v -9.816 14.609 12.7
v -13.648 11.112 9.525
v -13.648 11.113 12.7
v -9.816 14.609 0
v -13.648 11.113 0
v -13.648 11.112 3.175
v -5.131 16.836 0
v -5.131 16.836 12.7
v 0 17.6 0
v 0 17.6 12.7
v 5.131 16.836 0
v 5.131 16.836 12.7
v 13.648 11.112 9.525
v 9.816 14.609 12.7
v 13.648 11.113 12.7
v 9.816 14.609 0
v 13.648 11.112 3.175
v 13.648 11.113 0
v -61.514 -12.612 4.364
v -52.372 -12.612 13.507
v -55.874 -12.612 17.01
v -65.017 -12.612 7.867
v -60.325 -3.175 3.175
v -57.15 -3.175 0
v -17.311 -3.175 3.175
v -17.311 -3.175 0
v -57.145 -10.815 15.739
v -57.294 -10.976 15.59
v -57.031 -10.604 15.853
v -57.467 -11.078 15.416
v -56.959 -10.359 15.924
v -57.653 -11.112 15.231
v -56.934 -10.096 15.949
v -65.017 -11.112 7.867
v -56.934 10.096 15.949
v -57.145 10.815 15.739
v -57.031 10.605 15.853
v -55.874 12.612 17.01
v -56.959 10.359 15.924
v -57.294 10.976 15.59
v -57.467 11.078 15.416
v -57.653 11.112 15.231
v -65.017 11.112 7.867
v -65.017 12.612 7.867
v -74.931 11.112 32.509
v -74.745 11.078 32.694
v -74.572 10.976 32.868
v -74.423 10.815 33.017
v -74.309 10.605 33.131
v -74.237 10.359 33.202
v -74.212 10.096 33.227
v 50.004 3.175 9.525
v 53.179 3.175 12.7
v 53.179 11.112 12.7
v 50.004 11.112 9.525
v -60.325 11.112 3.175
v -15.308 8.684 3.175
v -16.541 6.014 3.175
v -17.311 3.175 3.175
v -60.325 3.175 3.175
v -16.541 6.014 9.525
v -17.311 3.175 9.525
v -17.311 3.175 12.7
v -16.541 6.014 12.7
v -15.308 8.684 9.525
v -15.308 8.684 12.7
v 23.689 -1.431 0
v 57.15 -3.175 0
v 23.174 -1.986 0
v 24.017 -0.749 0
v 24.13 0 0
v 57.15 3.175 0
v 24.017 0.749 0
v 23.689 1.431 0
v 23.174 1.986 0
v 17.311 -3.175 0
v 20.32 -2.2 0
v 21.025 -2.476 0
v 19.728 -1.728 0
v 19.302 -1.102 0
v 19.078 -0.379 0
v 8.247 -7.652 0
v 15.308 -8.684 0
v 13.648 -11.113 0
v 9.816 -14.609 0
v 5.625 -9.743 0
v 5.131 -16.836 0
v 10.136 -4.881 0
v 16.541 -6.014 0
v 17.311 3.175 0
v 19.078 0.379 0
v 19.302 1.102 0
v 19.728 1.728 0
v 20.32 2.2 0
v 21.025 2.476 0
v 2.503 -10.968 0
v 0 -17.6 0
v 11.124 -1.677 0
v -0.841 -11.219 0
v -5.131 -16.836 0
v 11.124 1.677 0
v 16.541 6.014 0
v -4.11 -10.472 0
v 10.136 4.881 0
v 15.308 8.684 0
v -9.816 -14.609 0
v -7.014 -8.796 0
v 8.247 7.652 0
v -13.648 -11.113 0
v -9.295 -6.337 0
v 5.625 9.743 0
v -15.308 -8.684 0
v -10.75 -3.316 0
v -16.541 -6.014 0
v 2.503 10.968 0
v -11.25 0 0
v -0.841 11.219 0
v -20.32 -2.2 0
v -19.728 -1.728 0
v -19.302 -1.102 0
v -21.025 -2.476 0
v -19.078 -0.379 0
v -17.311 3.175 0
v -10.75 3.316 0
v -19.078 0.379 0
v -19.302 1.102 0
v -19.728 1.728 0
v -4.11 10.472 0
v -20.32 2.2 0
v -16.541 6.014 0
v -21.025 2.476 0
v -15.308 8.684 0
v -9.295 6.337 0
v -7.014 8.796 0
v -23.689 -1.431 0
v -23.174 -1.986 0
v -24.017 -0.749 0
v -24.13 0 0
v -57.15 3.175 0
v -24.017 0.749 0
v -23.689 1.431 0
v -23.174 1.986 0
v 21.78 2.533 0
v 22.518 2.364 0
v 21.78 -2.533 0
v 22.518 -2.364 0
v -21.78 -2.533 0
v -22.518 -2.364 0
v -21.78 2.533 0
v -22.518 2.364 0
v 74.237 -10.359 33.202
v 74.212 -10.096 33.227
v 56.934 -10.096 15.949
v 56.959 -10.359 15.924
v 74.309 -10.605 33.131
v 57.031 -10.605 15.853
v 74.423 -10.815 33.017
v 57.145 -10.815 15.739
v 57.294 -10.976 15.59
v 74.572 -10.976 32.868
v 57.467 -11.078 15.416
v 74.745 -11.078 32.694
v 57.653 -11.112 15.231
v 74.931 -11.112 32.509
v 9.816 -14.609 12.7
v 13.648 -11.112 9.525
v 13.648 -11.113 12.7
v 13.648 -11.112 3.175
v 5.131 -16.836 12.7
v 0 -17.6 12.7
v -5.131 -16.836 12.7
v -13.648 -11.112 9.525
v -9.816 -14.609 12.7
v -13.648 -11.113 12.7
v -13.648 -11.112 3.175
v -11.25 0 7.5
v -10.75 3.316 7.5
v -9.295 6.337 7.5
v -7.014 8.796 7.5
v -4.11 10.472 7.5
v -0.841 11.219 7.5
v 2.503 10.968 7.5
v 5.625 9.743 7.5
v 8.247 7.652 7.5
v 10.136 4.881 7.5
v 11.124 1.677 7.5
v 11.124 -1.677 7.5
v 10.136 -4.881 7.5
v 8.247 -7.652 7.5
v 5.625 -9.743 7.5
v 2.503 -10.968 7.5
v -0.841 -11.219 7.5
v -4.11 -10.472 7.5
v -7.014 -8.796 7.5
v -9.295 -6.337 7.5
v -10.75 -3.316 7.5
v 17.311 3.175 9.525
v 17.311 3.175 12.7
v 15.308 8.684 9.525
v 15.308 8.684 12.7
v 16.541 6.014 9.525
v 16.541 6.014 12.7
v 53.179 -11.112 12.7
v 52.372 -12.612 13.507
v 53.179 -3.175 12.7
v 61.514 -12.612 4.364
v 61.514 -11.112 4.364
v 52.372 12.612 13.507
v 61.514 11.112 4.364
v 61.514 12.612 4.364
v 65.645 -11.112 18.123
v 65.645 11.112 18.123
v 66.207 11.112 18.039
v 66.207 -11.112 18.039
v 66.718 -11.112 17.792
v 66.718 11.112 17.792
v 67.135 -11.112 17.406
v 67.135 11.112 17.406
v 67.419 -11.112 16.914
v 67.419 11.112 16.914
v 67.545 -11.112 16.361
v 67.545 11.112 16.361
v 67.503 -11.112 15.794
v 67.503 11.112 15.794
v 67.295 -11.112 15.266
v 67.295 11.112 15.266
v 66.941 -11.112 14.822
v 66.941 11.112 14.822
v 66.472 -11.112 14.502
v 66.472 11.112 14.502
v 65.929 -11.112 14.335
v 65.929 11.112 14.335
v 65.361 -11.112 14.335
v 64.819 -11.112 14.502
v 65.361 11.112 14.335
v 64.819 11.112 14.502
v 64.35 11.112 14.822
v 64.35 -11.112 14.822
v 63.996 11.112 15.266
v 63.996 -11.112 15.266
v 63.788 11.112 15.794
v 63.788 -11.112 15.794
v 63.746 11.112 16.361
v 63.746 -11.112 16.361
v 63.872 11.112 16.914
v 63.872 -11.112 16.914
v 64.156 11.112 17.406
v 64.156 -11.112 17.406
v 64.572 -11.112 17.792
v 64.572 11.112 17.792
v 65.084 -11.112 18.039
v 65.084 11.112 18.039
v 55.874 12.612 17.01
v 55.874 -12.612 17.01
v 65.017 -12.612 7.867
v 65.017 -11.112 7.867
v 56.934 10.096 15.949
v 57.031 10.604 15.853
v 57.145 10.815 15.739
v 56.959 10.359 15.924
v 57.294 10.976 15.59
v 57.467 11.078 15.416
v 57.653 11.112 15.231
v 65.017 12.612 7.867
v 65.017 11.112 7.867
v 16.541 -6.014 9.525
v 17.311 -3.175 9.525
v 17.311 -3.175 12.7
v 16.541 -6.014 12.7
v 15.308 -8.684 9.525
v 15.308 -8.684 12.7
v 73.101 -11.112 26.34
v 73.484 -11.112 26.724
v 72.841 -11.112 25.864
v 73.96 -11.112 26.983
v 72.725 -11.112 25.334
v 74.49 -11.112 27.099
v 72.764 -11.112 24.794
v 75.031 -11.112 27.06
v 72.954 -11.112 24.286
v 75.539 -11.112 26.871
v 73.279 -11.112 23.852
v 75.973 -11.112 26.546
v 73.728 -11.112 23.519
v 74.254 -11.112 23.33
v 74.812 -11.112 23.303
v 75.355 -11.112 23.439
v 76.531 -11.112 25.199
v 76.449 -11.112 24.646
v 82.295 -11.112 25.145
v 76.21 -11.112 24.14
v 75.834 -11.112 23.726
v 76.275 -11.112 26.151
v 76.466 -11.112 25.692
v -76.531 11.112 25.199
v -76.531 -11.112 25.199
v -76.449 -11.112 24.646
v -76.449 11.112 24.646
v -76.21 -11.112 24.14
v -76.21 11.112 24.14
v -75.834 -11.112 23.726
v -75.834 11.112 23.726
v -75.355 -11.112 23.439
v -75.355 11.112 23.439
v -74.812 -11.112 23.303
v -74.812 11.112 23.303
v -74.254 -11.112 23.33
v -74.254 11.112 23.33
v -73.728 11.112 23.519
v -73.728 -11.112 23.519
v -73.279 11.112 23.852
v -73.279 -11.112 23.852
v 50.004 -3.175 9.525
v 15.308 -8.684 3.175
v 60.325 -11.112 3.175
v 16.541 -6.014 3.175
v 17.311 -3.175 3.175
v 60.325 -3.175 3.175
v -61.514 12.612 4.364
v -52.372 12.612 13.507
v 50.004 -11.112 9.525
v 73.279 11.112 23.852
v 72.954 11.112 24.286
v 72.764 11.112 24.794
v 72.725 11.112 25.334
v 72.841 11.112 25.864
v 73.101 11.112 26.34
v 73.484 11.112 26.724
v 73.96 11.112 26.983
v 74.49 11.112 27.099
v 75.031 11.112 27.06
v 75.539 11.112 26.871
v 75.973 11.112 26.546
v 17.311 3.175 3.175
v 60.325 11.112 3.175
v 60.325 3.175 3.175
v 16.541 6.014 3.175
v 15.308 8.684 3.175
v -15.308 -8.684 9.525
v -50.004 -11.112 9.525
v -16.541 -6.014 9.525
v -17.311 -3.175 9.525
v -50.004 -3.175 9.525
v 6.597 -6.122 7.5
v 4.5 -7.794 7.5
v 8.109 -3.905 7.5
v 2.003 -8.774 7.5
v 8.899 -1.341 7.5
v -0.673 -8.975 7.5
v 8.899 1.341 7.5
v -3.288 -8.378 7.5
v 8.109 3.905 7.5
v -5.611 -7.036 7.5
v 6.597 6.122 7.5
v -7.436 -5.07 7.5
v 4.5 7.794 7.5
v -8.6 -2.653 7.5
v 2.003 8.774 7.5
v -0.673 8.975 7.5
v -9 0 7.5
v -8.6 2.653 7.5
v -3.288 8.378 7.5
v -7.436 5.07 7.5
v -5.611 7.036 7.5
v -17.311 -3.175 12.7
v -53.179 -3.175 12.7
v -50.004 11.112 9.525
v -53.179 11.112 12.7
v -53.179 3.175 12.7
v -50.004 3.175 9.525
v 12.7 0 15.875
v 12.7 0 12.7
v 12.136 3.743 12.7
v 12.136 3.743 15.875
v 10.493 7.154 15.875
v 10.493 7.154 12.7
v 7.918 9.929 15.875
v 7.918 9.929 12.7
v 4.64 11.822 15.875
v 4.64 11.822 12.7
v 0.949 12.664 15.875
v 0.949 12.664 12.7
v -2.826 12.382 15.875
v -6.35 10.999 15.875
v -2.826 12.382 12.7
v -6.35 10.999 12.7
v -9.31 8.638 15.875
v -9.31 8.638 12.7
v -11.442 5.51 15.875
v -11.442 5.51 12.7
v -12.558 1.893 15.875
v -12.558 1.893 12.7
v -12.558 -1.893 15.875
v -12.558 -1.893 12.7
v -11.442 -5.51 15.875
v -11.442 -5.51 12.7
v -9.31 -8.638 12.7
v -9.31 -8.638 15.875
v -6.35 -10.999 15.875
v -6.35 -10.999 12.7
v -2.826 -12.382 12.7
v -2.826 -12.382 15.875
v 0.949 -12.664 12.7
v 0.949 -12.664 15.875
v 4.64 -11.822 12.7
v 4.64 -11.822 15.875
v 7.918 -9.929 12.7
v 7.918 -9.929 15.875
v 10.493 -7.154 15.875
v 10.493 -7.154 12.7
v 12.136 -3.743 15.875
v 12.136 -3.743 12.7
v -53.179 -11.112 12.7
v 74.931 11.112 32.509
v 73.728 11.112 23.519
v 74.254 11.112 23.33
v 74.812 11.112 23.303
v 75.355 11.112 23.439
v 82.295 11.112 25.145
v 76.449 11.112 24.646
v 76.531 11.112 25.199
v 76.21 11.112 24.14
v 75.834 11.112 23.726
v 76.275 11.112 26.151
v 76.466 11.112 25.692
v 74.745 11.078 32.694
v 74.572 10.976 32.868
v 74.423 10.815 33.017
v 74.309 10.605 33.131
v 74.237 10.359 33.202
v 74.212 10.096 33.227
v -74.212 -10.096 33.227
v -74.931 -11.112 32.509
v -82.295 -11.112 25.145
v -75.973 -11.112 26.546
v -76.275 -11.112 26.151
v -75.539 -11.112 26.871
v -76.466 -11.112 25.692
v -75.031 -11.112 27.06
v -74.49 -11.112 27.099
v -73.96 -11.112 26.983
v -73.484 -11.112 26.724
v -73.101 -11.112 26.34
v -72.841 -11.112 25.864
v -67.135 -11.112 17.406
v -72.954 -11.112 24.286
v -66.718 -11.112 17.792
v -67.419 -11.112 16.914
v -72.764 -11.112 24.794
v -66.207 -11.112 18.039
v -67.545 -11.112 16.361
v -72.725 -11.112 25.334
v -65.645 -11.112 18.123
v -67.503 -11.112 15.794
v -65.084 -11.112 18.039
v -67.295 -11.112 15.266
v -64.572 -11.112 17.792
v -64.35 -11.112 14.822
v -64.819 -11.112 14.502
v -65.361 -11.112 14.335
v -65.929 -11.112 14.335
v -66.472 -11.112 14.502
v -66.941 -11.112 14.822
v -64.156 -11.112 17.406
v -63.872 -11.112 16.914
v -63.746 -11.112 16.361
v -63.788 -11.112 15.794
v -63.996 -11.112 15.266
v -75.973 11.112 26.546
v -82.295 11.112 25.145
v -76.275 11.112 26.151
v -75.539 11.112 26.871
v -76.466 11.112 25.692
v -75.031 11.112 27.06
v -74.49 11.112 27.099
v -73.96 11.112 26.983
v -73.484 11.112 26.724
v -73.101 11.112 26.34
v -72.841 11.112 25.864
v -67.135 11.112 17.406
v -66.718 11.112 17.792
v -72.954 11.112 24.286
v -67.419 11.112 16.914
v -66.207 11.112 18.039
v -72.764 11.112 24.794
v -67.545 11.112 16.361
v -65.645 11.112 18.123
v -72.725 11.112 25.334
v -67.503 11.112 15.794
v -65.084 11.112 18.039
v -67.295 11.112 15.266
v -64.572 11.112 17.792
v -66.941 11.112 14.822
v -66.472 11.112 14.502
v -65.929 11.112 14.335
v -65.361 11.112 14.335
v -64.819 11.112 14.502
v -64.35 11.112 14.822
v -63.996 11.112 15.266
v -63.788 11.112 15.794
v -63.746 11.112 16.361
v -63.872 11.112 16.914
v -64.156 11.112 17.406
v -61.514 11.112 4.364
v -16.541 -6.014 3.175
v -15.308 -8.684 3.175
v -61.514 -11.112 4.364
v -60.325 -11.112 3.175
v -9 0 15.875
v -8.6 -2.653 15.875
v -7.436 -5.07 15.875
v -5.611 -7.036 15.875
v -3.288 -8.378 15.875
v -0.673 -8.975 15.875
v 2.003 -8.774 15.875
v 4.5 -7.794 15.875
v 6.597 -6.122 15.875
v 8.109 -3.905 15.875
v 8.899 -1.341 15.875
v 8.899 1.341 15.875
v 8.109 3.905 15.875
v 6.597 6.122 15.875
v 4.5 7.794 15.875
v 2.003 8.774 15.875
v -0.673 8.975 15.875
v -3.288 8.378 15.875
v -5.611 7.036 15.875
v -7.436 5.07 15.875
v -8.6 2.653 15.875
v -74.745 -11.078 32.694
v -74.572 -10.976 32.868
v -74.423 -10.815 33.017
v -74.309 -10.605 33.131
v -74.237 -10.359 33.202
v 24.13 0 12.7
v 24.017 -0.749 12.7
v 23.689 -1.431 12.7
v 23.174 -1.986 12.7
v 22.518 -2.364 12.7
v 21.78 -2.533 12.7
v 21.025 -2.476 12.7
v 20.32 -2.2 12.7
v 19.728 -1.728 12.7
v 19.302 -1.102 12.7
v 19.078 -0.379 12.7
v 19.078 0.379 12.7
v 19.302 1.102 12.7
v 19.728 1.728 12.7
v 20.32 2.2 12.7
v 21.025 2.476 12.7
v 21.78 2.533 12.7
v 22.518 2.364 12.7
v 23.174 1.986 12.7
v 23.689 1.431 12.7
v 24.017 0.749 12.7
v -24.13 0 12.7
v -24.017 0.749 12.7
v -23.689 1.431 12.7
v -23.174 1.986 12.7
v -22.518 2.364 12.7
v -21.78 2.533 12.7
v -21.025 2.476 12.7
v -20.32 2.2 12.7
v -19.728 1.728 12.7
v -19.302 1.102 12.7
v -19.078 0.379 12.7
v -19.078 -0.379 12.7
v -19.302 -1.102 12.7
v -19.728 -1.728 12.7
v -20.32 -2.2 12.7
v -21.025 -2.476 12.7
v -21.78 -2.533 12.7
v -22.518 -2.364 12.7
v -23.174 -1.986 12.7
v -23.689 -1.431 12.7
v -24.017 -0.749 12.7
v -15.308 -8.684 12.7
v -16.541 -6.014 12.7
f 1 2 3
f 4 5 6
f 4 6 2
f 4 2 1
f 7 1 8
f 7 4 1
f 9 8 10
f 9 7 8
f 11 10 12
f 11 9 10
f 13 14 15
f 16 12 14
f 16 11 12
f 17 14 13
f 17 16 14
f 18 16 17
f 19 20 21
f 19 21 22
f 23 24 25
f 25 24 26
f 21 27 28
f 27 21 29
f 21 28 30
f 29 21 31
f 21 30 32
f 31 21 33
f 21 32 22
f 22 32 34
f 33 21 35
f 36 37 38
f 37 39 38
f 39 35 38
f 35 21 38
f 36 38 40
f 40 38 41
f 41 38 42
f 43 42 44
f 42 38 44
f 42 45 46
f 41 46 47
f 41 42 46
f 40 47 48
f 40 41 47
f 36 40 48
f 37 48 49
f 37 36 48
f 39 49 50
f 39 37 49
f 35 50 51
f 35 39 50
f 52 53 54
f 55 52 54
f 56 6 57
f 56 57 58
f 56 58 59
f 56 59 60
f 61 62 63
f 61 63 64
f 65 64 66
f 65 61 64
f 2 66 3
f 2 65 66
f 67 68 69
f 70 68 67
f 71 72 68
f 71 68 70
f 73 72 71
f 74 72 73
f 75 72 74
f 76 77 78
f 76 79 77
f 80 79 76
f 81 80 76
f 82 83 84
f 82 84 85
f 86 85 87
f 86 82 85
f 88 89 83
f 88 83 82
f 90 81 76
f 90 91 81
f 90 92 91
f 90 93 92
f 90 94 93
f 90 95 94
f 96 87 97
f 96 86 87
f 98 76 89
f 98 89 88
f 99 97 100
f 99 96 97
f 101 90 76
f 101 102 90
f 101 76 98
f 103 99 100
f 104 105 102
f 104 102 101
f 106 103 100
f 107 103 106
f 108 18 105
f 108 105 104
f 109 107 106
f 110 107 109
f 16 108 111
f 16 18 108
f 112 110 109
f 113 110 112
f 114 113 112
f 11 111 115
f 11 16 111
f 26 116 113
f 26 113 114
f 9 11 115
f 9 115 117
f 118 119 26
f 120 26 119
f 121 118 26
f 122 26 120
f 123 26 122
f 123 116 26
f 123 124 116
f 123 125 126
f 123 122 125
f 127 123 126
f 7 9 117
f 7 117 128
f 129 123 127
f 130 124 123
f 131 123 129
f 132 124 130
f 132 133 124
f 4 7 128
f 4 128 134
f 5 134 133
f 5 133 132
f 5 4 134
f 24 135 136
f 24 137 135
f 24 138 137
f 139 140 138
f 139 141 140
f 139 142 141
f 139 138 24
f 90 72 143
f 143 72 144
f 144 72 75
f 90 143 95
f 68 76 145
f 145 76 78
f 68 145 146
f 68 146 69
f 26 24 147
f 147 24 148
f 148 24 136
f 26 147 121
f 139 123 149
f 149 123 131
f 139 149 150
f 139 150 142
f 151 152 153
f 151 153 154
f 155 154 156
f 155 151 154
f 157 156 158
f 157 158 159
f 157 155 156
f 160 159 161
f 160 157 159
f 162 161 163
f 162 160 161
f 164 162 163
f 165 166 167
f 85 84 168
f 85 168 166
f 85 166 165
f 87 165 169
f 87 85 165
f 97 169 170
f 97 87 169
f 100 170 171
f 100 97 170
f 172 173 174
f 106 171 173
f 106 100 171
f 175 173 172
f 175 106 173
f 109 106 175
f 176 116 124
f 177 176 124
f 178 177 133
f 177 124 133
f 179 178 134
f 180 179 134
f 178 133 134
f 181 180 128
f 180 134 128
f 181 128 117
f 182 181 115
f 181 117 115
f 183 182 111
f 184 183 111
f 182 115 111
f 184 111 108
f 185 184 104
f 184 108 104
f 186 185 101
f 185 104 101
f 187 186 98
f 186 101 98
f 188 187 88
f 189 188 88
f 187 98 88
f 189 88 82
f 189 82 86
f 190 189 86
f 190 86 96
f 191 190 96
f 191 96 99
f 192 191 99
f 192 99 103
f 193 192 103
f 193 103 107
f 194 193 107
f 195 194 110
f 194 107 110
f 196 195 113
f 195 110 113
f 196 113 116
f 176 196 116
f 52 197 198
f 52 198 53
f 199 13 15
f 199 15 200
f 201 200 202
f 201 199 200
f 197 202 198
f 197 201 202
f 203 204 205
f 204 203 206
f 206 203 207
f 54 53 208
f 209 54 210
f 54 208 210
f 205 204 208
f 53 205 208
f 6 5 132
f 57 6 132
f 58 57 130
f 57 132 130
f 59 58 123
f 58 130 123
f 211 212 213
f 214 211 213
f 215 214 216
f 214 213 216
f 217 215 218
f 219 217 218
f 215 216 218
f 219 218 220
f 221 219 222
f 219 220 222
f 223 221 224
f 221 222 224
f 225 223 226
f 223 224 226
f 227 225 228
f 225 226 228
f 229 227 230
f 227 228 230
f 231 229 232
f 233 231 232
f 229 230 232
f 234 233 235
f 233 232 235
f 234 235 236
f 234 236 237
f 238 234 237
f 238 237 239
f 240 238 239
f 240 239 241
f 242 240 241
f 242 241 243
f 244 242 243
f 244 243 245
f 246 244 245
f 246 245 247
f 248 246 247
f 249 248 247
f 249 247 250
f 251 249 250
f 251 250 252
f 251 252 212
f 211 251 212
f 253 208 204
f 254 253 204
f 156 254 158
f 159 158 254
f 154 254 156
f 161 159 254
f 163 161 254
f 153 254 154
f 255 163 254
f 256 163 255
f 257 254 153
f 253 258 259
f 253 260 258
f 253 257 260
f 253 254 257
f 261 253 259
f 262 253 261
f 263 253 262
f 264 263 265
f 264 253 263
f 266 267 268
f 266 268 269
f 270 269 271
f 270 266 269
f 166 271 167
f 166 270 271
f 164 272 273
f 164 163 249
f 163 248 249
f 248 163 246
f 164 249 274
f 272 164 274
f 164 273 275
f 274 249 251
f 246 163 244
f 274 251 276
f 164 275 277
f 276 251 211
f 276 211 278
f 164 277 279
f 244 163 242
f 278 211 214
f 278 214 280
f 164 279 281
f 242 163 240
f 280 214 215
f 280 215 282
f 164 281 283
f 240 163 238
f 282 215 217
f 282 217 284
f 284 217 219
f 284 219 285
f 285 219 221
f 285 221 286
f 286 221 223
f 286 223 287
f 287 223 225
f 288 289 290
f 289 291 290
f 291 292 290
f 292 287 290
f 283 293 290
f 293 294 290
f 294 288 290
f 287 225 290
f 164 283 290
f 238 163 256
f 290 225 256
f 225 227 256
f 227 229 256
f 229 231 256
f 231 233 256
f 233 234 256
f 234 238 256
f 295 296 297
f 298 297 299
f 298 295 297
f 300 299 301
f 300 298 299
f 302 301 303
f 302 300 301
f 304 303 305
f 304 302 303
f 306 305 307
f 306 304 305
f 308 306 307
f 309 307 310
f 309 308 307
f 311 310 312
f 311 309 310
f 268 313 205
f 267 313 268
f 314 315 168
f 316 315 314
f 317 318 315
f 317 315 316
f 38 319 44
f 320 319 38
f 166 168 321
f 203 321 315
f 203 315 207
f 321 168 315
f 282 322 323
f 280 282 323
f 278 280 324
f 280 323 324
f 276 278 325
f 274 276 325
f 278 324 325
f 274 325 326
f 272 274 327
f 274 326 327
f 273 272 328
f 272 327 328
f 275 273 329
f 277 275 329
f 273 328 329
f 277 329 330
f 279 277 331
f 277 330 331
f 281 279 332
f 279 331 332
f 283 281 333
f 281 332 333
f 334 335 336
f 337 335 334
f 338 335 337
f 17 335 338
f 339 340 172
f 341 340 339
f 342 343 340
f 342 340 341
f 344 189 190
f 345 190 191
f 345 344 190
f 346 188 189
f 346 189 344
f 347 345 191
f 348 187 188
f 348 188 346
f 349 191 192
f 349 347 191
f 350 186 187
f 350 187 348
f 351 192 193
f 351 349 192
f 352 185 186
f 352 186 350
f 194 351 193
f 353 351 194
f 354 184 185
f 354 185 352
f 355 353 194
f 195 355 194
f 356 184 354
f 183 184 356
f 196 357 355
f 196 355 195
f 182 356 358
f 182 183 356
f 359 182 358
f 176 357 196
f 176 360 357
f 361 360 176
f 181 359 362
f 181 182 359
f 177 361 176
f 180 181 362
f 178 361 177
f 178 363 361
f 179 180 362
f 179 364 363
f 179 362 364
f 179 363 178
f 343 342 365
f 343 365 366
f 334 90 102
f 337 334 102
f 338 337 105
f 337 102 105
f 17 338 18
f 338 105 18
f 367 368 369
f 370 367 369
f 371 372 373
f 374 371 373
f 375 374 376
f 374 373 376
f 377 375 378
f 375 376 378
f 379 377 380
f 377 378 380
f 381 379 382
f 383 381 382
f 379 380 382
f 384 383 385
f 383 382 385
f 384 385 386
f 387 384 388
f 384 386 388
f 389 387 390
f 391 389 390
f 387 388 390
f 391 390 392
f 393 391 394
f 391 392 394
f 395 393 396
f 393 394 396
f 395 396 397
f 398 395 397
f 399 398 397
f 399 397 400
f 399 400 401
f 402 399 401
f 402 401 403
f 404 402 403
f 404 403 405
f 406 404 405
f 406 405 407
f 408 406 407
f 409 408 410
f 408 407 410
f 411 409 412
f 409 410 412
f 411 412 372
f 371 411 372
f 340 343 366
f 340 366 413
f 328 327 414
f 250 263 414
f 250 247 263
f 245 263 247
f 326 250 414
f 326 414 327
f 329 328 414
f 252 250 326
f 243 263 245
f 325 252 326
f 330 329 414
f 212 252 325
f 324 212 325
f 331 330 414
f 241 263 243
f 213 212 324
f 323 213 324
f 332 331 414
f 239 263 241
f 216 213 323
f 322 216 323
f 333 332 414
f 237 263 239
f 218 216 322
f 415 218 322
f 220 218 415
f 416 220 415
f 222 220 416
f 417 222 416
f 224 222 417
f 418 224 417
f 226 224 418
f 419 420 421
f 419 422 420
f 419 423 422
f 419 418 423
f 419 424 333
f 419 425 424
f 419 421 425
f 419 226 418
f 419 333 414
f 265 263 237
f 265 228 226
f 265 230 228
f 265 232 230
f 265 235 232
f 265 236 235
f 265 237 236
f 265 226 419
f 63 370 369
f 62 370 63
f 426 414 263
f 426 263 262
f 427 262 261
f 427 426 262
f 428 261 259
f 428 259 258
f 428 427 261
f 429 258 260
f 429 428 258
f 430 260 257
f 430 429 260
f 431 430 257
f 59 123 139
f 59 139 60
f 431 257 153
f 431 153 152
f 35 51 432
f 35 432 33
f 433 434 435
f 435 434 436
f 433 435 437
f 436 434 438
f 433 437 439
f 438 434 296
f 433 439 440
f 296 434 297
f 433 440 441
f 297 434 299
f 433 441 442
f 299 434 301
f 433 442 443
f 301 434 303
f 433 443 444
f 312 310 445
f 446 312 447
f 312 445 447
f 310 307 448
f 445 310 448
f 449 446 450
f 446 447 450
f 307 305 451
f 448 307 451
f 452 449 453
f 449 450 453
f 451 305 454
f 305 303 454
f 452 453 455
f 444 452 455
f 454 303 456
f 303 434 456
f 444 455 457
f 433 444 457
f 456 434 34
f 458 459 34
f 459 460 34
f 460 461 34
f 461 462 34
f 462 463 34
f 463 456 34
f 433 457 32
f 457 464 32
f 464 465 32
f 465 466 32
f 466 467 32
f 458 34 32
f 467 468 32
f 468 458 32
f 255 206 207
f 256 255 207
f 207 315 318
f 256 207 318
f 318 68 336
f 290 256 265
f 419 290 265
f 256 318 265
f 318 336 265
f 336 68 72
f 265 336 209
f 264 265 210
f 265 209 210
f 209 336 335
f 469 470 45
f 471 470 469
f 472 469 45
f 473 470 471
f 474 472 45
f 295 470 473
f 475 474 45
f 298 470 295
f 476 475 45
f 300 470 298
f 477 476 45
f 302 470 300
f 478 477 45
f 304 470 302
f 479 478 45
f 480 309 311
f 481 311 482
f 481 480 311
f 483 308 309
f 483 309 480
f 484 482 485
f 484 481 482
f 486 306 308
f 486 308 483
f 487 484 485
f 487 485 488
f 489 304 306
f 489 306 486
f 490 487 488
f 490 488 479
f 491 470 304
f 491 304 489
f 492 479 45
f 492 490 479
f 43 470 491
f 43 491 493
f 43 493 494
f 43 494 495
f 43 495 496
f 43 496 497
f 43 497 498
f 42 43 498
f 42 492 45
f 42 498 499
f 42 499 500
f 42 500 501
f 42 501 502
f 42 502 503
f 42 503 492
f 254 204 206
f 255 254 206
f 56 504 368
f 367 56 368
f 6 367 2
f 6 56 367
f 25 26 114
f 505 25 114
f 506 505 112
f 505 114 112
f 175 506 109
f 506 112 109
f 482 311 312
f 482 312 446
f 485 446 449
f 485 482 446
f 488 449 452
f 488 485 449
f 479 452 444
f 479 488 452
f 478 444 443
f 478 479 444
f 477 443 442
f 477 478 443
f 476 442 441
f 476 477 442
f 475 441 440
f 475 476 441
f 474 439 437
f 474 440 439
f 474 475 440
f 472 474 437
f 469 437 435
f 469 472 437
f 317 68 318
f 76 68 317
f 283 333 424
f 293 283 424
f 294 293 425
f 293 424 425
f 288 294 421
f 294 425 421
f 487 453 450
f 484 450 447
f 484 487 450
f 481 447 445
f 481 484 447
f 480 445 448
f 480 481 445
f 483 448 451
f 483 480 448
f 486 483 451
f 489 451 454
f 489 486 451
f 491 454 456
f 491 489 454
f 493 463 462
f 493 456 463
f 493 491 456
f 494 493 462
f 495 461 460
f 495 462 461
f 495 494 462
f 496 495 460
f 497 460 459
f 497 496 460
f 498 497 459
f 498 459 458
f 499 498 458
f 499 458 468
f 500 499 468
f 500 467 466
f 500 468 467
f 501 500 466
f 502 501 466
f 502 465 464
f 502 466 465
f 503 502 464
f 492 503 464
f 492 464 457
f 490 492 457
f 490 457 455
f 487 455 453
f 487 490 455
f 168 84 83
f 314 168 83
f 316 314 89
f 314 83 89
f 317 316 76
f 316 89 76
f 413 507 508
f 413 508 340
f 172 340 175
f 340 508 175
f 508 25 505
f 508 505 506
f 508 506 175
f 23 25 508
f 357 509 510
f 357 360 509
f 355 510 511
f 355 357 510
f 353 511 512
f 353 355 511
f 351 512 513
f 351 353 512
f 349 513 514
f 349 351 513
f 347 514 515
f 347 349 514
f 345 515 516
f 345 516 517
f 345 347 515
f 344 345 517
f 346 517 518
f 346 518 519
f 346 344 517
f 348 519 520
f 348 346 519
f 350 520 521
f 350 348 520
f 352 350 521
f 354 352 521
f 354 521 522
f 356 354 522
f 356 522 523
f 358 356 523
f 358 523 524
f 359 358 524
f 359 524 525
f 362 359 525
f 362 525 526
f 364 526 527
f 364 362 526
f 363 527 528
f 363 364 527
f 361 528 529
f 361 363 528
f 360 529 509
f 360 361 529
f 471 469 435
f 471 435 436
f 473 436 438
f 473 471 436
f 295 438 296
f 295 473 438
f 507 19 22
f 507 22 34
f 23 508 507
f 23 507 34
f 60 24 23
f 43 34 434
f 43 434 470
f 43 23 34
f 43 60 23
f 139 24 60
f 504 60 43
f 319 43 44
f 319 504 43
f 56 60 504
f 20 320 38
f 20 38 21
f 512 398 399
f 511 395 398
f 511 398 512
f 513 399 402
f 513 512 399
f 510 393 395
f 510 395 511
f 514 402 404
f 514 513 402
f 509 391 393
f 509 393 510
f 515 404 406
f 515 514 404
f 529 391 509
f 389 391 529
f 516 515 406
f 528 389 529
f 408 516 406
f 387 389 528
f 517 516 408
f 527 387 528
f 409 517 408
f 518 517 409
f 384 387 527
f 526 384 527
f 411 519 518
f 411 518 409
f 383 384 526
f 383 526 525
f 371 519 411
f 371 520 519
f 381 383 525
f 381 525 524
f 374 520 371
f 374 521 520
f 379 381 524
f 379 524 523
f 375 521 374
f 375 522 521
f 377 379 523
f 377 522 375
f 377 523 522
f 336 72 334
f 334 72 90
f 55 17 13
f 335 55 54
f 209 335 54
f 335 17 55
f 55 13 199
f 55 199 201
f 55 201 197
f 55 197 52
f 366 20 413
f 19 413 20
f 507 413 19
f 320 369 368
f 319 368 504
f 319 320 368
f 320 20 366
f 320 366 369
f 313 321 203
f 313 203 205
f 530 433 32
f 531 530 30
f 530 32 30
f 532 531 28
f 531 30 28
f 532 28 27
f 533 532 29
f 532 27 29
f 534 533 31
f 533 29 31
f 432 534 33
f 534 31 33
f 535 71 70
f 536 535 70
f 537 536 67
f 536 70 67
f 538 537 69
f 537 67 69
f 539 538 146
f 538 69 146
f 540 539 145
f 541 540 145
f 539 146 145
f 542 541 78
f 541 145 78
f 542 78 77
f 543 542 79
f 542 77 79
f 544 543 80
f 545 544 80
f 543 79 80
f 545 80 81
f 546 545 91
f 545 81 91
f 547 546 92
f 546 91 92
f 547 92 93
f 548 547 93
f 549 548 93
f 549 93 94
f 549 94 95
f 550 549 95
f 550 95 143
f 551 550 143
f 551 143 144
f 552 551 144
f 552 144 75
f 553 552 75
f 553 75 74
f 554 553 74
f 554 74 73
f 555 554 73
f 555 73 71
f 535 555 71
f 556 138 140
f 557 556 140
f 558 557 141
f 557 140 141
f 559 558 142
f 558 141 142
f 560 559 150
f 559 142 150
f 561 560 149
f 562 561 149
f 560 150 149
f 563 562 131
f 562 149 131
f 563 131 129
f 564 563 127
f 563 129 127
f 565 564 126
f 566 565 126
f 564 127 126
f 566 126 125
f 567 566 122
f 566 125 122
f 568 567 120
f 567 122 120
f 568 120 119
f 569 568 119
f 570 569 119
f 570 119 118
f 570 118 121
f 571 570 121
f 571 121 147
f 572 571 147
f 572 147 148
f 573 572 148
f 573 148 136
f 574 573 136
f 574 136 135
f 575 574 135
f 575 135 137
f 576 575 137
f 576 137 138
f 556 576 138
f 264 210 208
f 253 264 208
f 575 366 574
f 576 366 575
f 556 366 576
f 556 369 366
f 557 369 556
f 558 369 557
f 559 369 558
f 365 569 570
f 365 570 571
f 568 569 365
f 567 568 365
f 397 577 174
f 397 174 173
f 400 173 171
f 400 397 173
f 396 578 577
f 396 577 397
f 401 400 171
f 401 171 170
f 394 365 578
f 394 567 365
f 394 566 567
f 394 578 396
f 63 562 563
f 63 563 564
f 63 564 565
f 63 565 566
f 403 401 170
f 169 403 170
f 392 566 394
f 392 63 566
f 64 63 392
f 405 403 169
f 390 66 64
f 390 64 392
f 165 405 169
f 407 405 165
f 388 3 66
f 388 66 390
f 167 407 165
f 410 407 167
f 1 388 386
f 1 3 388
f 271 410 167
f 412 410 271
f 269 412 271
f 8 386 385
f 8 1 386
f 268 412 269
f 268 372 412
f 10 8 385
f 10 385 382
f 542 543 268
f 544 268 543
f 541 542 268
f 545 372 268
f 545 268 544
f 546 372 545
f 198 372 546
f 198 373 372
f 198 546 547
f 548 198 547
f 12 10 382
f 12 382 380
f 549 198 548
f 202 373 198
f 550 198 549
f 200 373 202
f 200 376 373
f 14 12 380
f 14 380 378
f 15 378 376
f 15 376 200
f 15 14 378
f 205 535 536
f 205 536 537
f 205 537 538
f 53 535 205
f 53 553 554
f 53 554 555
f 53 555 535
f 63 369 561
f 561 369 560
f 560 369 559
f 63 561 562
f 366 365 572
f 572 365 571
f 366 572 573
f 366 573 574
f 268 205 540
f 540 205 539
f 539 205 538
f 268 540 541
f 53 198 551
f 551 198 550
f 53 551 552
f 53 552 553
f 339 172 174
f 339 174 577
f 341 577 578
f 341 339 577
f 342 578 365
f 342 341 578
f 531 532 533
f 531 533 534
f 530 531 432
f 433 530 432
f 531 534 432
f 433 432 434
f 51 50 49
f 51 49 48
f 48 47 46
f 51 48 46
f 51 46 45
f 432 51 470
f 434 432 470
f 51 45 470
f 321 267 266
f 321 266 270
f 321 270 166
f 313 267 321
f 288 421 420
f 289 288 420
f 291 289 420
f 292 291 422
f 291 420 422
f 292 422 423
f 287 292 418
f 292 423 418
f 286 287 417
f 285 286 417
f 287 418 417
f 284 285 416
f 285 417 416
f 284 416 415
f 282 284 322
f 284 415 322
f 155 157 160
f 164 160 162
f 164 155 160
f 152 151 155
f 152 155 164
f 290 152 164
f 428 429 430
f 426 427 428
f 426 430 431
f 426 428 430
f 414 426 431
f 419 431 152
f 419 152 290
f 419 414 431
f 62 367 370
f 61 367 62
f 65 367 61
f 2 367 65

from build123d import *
from build123d.topology import SkipClean

# Parameters (mm, degrees)
BOSS_EXTRUDE1_DEPTH = 11.1125
SKETCH3_R           = 17.6
BOSS_EXTRUDE2_DEPTH = 12.7
SKETCH3_5_R         = 11.25
CUT_EXTRUDE2_DEPTH  = 7.5
SKETCH3_6_R         = 9
CUT_EXTRUDE3_DEPTH  = 12.7
BOSS_EXTRUDE3_START = -31.9278
BOSS_EXTRUDE3_DEPTH = 4.953
FILLET1_R           = 1.016
SKETCH5_R           = 1.905
CUT_EXTRUDE4_DEPTH  = 96.510603758
FILLET3_R           = 1.016
CUT_EXTRUDE5_START  = -3.175
CUT_EXTRUDE5_DEPTH  = 3.175
SKETCH9_W           = 10.961249955
SKETCH9_H           = 7.9375
CUT_EXTRUDE6_DEPTH  = 3.175
CUT_EXTRUDE9_DEPTH  = 2.54
SKETCH13_R          = 12.7
SKETCH13_R_2        = 9
BOSS_EXTRUDE6_DEPTH = 3.175
CHAMFER2_SIZE       = 3.175
SKETCH15_R          = 2.54
CUT_EXTRUDE10_DEPTH = 91.477679673


with BuildPart() as part:
    # Sketch2 → Boss-Extrude1 (new, symmetric)
    with BuildSketch(Plane(origin=(0, 0, 0), x_dir=(1, 0, 0), z_dir=(0, 1, 0))):
        Polygon((0, 0), (-57.15, 0), (-84.090768363, -26.940768363), (-76.008537854, -35.022998872), (-53.685538982, -12.7), (0, -12.7), align=None)
        Polygon((57.15, 0), (0, 0), (0, -12.7), (53.685538982, -12.7), (76.008537854, -35.022998872), (84.090768363, -26.940768363), align=None)
    extrude(amount=BOSS_EXTRUDE1_DEPTH, both=True)

    # Sketch3 → Boss-Extrude2 (add)
    with BuildSketch(Plane(origin=(0, 0, 0), x_dir=(-1, 0, 0), z_dir=(0, 0, -1))):
        Circle(SKETCH3_R)
    extrude(amount=-BOSS_EXTRUDE2_DEPTH)

    # Sketch3<5> → Cut-Extrude2 (cut)
    with BuildSketch(Plane(origin=(0, 0, 0), x_dir=(-1, 0, 0), z_dir=(0, 0, -1))):
        Circle(SKETCH3_5_R)
    extrude(amount=-CUT_EXTRUDE2_DEPTH, mode=Mode.SUBTRACT)

    # Sketch3<6> → Cut-Extrude3 (cut)
    with BuildSketch(Plane(origin=(0, 0, 0), x_dir=(-1, 0, 0), z_dir=(0, 0, -1))):
        Circle(SKETCH3_6_R)
    extrude(amount=-CUT_EXTRUDE3_DEPTH, mode=Mode.SUBTRACT)

    # Sketch4 → Boss-Extrude3 (add)
    with BuildSketch(Plane(origin=(55.515768363, 0, 55.515768363), x_dir=(0.707106781186549, 0, -0.707106781186546), z_dir=(0.707106781186546, 0, 0.707106781186549)).offset(BOSS_EXTRUDE3_START)):
        Polygon((27.481152545, -12.6125), (40.411152545, -12.6125), (40.411152545, -11.1125), (28.981152545, -11.1125), (28.981152545, 11.1125), (40.411152545, 11.1125), (40.411152545, 12.6125), (27.481152545, 12.6125), align=None)
    boss_extrude3 = extrude(amount=BOSS_EXTRUDE3_DEPTH)

    # Fillet1
    fillet1_edges = [part.edges().sort_by_distance(p)[0] for p in [
        (66.471505854, -11.1125, 25.485966872),
        (66.471505854, 11.1125, 25.485966872),
    ]]
    fillet(fillet1_edges, radius=FILLET1_R)

    # Sketch5 → Cut-Extrude4 (cut, through all)
    with BuildSketch(Plane(origin=(0, 11.1125, 0), x_dir=(1, 0, 0), z_dir=(0, 1, 0))):
        with BuildLine():
            ThreePointArc((73.278539993, -23.851560258), (73.278539993, -26.545637094), (75.97261683, -26.545637094))
            Line((75.97261683, -26.545637094), (73.278539993, -23.851560258))
        make_face()
        with BuildLine():
            Line((73.278539993, -23.851560258), (75.97261683, -26.545637094))
            ThreePointArc((75.97261683, -26.545637094), (76.385568921, -25.927610614), (76.530578412, -25.198598676))
            ThreePointArc((76.530578412, -25.198598676), (75.35459035, -23.438608166), (73.278539993, -23.851560258))
        make_face()
        with Locations(Location((65.645322291, -16.218342555, 0), (0, 0, 270))):
            Circle(SKETCH5_R)
    cut_extrude4 = extrude(amount=-CUT_EXTRUDE4_DEPTH, mode=Mode.SUBTRACT)

    # Mirror2: Boss-Extrude3, Cut-Extrude4 across plane
    add(boss_extrude3.mirror(Plane(origin=(0, 0, 0), x_dir=(0, 0, 1), z_dir=(1, 0, 0))))
    add(cut_extrude4.mirror(Plane(origin=(0, 0, 0), x_dir=(0, 0, 1), z_dir=(1, 0, 0))), mode=Mode.SUBTRACT)

    # Fillet3
    fillet3_edges = [part.edges().sort_by_distance(p)[0] for p in [
        (-66.471505854, -11.1125, 25.485966872),
        (-66.471505854, 11.1125, 25.485966872),
    ]]
    fillet(fillet3_edges, radius=FILLET3_R)

    # Sketch6 → Cut-Extrude5 (cut)
    with BuildSketch(Plane.XY.offset(12.7).offset(CUT_EXTRUDE5_START)):
        with BuildLine():
            Line((-53.17880895, 11.1125), (-53.17880895, 3.175))
            Line((-53.17880895, 3.175), (-17.311249955, 3.175))
            ThreePointArc((-17.311249955, 3.175), (-15.980371829, 7.374802791), (-13.648162651, 11.1125))
            Line((-13.648162651, 11.1125), (-53.17880895, 11.1125))
        make_face()
        with BuildLine():
            Line((-17.311249955, -3.175), (-53.17880895, -3.175))
            Line((-53.17880895, -3.175), (-53.17880895, -11.1125))
            Line((-53.17880895, -11.1125), (-13.648162651, -11.1125))
            ThreePointArc((-13.648162651, -11.1125), (-15.980371829, -7.374802791), (-17.311249955, -3.175))
        make_face()
        with BuildLine():
            Line((53.17880895, 11.1125), (13.648162651, 11.1125))
            ThreePointArc((13.648162651, 11.1125), (15.980371829, 7.374802791), (17.311249955, 3.175))
            Line((17.311249955, 3.175), (53.17880895, 3.175))
            Line((53.17880895, 3.175), (53.17880895, 11.1125))
        make_face()
        with BuildLine():
            ThreePointArc((17.311249955, -3.175), (15.980371829, -7.374802791), (13.648162651, -11.1125))
            Line((13.648162651, -11.1125), (53.17880895, -11.1125))
            Line((53.17880895, -11.1125), (53.17880895, -3.175))
            Line((53.17880895, -3.175), (17.311249955, -3.175))
        make_face()
    extrude(amount=CUT_EXTRUDE5_DEPTH, mode=Mode.SUBTRACT)

    # Sketch9 → Cut-Extrude6 (cut)
    with SkipClean():  # the faces are left unmerged after this step: merging them gives an invalid solid
        with BuildSketch(Plane(origin=(0, 0, 0), x_dir=(-1, 0, 0), z_dir=(0, 0, -1))):
            with Locations((62.630624978, -7.14375)):
                Rectangle(SKETCH9_W, SKETCH9_H)
            with BuildLine():
                ThreePointArc((17.311249955, -3.175), (15.980371829, -7.374802791), (13.648162651, -11.1125))
                Line((13.648162651, -11.1125), (57.15, -11.1125))
                Line((57.15, -11.1125), (57.15, -3.175))
                Line((57.15, -3.175), (17.311249955, -3.175))
            make_face()
            with BuildLine():
                Line((57.15, 11.1125), (13.648162651, 11.1125))
                ThreePointArc((13.648162651, 11.1125), (15.980371829, 7.374802791), (17.311249955, 3.175))
                Line((17.311249955, 3.175), (57.15, 3.175))
                Line((57.15, 3.175), (57.15, 11.1125))
            make_face()
            with Locations((62.630624978, 7.14375)):
                Rectangle(SKETCH9_W, SKETCH9_H)
            with BuildLine():
                ThreePointArc((-13.648162651, -11.1125), (-15.980371829, -7.374802791), (-17.311249955, -3.175))
                Line((-17.311249955, -3.175), (-57.15, -3.175))
                Line((-57.15, -3.175), (-57.15, -11.1125))
                Line((-57.15, -11.1125), (-13.648162651, -11.1125))
            make_face()
            with Locations((-62.630624978, -7.14375)):
                Rectangle(SKETCH9_W, SKETCH9_H)
            with BuildLine():
                Line((-57.15, 3.175), (-17.311249955, 3.175))
                ThreePointArc((-17.311249955, 3.175), (-15.980371829, 7.374802791), (-13.648162651, 11.1125))
                Line((-13.648162651, 11.1125), (-57.15, 11.1125))
                Line((-57.15, 11.1125), (-57.15, 3.175))
            make_face()
            with Locations((-62.630624978, 7.14375)):
                Rectangle(SKETCH9_W, SKETCH9_H)
        extrude(amount=-CUT_EXTRUDE6_DEPTH, mode=Mode.SUBTRACT)

    # Sketch12 → Cut-Extrude9 (cut)
    with SkipClean():  # the faces are left unmerged after this step: merging them gives an invalid solid
        with BuildSketch(Plane(origin=(55.515768363, 0, 55.515768363), x_dir=(0.7071067811865486, 0, -0.7071067811865465), z_dir=(0.7071067811865465, 0, 0.7071067811865486))):
            with BuildLine():
                Line((28.981152545, 10.0965), (28.981152545, -10.0965))
                ThreePointArc((28.981152545, -10.0965), (29.278732055, -10.81492049), (29.997152545, -11.1125))
                Line((29.997152545, -11.1125), (40.411152545, -11.1125))
                Line((40.411152545, -11.1125), (40.411152545, 11.1125))
                Line((40.411152545, 11.1125), (29.997152545, 11.1125))
                ThreePointArc((29.997152545, 11.1125), (29.278732055, 10.81492049), (28.981152545, 10.0965))
            make_face()
        cut_extrude9 = extrude(amount=-CUT_EXTRUDE9_DEPTH, mode=Mode.SUBTRACT)

    # Mirror3: Cut-Extrude9 across plane
    with SkipClean():  # the faces are left unmerged after this step: merging them gives an invalid solid
        add(cut_extrude9.mirror(Plane(origin=(0, 0, 0), x_dir=(0, 0, 1), z_dir=(1, 0, 0))), mode=Mode.SUBTRACT)

    # Sketch13 → Boss-Extrude6 (add)
    with SkipClean():  # the faces are left unmerged after this step: merging them gives an invalid solid
        with BuildSketch(Plane.XY.offset(12.7)):
            Circle(SKETCH13_R)
            with Locations(Location((0, 0, 0), (0, 0, 180))):
                Circle(SKETCH13_R_2, mode=Mode.SUBTRACT)
        extrude(amount=BOSS_EXTRUDE6_DEPTH)

    # Chamfer2
    chamfer2_edges = [part.edges().sort_by_distance(p)[0] for p in [
        (53.17880895, 7.14375, 9.525),
        (53.17880895, -7.14375, 9.525),
        (-53.17880895, 7.14375, 9.525),
        (-53.17880895, -7.14375, 9.525),
    ]]
    chamfer(chamfer2_edges, length=CHAMFER2_SIZE - 0.0001)  # a hair under: the kernel refuses the full size

    # Sketch15 → Cut-Extrude10 (cut, through all)
    with BuildSketch(Plane(origin=(0, 0, 0), x_dir=(-1, 0, 0), z_dir=(0, 0, -1))):
        with Locations((21.59, 0)):
            Circle(SKETCH15_R)
        with Locations(Location((-21.59, 0, 0), (0, 0, 180))):
            Circle(SKETCH15_R)
    extrude(amount=-CUT_EXTRUDE10_DEPTH, mode=Mode.SUBTRACT)


solid = part.part
